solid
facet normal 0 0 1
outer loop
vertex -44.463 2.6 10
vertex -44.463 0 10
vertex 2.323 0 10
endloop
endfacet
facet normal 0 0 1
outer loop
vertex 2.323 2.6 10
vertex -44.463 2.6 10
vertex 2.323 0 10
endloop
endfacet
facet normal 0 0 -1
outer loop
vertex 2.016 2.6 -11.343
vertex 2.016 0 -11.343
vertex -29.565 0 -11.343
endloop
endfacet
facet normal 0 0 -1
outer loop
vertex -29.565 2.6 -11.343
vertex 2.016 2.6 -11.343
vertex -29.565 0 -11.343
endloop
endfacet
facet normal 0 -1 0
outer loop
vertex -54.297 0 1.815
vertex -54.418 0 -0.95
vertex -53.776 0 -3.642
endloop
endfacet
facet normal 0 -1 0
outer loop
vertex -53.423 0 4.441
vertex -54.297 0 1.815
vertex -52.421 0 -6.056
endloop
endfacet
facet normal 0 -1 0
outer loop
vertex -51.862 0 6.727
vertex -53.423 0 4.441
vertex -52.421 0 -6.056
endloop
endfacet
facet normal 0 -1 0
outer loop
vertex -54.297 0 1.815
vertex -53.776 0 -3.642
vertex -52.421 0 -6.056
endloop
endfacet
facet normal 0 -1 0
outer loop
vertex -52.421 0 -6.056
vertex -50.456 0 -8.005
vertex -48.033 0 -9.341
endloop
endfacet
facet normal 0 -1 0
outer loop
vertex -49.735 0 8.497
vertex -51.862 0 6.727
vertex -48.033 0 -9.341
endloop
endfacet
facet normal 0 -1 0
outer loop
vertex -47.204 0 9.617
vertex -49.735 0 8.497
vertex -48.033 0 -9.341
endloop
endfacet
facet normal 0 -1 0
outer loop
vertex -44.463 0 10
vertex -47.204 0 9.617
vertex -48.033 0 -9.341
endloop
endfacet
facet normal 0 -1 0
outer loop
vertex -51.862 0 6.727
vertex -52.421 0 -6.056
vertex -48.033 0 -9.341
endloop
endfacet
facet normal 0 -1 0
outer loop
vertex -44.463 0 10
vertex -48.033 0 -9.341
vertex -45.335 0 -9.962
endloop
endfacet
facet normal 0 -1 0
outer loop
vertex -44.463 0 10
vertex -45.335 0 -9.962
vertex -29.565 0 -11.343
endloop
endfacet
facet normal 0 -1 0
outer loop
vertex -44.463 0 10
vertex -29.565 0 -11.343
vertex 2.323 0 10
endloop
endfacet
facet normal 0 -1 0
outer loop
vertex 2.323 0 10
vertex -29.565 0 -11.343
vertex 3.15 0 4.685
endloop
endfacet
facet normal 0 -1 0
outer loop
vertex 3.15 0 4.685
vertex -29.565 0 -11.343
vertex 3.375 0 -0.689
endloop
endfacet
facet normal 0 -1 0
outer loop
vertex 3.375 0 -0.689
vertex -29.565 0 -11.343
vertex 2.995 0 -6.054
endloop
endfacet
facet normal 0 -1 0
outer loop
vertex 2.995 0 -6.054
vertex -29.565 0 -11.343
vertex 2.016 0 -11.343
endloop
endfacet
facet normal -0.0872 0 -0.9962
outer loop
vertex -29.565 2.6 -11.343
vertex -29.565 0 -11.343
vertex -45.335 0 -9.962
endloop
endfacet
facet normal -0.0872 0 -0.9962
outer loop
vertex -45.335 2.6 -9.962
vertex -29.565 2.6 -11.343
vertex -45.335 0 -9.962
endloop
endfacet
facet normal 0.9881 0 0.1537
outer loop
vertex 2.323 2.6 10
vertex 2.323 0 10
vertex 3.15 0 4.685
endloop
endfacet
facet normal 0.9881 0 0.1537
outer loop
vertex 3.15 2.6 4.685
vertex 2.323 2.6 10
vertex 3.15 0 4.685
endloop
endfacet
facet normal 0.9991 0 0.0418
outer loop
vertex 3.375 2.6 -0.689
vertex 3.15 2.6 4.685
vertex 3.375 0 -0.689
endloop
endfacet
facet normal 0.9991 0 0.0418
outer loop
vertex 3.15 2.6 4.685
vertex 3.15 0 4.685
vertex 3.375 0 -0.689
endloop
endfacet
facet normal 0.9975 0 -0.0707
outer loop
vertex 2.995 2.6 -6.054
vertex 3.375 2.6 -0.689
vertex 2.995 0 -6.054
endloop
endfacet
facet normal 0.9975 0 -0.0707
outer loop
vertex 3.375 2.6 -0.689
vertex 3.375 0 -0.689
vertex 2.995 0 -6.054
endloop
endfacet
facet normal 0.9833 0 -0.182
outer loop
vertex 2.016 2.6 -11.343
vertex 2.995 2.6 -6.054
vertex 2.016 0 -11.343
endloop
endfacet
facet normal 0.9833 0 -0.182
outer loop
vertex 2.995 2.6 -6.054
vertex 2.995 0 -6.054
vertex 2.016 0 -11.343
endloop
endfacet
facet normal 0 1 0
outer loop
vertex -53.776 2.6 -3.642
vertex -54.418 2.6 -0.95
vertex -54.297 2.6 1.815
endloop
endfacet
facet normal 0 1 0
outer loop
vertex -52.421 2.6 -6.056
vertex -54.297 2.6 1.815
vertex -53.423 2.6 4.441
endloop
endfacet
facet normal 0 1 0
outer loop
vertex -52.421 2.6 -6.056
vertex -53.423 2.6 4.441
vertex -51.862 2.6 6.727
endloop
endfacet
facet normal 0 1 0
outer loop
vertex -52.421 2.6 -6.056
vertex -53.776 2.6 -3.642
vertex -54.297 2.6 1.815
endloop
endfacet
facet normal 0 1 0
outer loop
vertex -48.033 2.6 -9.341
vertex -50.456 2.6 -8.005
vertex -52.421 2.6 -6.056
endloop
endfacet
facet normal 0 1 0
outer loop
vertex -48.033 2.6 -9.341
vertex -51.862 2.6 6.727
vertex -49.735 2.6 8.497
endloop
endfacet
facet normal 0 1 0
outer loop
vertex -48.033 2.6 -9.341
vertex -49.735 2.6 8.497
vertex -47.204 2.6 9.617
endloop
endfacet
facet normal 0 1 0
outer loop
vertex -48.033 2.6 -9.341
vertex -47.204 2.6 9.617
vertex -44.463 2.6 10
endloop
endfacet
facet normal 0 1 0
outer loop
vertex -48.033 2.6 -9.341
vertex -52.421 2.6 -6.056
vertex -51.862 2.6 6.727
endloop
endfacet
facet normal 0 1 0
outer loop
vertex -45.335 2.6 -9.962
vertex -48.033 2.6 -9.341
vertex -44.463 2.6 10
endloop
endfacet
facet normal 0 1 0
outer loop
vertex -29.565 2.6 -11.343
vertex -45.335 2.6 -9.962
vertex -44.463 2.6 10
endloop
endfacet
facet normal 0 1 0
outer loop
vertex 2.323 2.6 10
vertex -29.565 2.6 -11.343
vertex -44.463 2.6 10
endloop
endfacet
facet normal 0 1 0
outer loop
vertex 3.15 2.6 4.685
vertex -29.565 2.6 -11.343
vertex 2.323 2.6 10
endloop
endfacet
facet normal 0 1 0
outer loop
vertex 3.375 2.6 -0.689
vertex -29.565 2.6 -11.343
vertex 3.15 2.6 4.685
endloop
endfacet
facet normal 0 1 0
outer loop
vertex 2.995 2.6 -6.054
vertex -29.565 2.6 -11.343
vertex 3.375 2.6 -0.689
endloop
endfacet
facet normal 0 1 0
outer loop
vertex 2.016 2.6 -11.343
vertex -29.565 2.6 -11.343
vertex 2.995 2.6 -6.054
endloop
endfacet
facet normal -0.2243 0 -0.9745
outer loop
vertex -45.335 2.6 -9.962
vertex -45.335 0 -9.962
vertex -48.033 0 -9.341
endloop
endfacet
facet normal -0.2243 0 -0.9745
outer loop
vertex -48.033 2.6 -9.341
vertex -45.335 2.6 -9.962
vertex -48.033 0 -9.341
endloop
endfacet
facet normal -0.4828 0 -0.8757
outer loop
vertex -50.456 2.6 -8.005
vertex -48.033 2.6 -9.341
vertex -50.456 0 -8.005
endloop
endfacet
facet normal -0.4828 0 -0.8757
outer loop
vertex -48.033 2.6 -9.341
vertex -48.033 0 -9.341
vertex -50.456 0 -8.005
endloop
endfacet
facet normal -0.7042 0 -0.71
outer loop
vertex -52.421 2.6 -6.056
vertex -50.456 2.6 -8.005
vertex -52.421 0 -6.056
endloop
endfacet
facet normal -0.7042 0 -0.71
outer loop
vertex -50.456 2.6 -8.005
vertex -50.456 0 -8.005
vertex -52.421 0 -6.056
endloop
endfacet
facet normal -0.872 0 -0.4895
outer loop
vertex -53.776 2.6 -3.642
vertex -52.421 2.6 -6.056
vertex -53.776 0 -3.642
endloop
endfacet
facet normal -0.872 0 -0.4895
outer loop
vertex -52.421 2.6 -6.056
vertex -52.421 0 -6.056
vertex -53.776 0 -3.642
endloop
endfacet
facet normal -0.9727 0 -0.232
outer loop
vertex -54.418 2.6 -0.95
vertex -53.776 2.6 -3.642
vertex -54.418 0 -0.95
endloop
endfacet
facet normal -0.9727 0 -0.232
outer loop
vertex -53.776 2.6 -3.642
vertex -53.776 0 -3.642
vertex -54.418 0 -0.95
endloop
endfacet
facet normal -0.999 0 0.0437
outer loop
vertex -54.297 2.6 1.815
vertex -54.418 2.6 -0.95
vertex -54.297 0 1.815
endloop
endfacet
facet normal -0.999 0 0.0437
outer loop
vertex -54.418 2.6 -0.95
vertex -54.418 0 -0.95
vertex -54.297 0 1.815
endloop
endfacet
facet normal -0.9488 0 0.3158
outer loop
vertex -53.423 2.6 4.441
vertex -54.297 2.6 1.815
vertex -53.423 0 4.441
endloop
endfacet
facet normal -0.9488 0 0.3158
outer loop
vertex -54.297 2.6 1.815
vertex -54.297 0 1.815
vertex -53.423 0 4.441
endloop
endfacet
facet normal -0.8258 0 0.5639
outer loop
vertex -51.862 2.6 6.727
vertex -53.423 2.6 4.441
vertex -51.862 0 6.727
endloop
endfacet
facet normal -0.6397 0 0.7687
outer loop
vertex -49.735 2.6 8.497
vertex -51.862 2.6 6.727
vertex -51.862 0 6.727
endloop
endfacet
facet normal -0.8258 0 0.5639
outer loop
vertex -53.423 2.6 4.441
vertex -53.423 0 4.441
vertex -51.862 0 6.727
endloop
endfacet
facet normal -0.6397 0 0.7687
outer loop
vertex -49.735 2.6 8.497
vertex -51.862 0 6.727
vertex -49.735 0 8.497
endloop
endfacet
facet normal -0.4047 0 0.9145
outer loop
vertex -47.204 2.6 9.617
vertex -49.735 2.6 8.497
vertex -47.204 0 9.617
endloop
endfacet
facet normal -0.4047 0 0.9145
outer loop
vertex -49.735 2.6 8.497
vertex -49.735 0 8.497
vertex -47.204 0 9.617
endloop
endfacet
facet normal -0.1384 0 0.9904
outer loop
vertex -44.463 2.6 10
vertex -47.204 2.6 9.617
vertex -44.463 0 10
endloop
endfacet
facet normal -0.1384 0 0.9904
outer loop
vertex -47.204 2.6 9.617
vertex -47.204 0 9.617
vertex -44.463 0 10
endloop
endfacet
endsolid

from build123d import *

# Parameters (mm, degrees)
SKETCH1_R           = 10
BOSS_EXTRUDE1_DEPTH = 2.6


with BuildPart() as part:
    # Sketch1 → Boss-Extrude1 (new body)
    with BuildSketch(Plane(origin=(0, 0, 0), x_dir=(1, 0, 0), z_dir=(0, 1, 0))):
        with Locations((-44.462988446, 0)):
            Circle(SKETCH1_R)
        with BuildLine():
            Line((-29.565238745, 11.34310087), (-45.335497693, 9.961863662))
            ThreePointArc((-45.335497693, 9.961863662), (-37.707438597, 7.373096109), (-34.462988446, 0))
            ThreePointArc((-34.462988446, 0), (-37.391920635, -7.071067812), (-44.462988446, -10))
            Line((-44.462988446, -10), (-29.565238745, -10))
            Line((-29.565238745, -10), (-29.565238745, 11.34310087))
        make_face()
        with BuildLine():
            Line((-29.565238745, -10), (2.323097165, -10))
            ThreePointArc((2.323097165, -10), (3.374896218, 0.688910471), (2.015736466, 11.34310087))
            Line((2.015736466, 11.34310087), (-29.565238745, 11.34310087))
            Line((-29.565238745, 11.34310087), (-29.565238745, -10))
        make_face()
    extrude(amount=BOSS_EXTRUDE1_DEPTH)


solid = part.part
